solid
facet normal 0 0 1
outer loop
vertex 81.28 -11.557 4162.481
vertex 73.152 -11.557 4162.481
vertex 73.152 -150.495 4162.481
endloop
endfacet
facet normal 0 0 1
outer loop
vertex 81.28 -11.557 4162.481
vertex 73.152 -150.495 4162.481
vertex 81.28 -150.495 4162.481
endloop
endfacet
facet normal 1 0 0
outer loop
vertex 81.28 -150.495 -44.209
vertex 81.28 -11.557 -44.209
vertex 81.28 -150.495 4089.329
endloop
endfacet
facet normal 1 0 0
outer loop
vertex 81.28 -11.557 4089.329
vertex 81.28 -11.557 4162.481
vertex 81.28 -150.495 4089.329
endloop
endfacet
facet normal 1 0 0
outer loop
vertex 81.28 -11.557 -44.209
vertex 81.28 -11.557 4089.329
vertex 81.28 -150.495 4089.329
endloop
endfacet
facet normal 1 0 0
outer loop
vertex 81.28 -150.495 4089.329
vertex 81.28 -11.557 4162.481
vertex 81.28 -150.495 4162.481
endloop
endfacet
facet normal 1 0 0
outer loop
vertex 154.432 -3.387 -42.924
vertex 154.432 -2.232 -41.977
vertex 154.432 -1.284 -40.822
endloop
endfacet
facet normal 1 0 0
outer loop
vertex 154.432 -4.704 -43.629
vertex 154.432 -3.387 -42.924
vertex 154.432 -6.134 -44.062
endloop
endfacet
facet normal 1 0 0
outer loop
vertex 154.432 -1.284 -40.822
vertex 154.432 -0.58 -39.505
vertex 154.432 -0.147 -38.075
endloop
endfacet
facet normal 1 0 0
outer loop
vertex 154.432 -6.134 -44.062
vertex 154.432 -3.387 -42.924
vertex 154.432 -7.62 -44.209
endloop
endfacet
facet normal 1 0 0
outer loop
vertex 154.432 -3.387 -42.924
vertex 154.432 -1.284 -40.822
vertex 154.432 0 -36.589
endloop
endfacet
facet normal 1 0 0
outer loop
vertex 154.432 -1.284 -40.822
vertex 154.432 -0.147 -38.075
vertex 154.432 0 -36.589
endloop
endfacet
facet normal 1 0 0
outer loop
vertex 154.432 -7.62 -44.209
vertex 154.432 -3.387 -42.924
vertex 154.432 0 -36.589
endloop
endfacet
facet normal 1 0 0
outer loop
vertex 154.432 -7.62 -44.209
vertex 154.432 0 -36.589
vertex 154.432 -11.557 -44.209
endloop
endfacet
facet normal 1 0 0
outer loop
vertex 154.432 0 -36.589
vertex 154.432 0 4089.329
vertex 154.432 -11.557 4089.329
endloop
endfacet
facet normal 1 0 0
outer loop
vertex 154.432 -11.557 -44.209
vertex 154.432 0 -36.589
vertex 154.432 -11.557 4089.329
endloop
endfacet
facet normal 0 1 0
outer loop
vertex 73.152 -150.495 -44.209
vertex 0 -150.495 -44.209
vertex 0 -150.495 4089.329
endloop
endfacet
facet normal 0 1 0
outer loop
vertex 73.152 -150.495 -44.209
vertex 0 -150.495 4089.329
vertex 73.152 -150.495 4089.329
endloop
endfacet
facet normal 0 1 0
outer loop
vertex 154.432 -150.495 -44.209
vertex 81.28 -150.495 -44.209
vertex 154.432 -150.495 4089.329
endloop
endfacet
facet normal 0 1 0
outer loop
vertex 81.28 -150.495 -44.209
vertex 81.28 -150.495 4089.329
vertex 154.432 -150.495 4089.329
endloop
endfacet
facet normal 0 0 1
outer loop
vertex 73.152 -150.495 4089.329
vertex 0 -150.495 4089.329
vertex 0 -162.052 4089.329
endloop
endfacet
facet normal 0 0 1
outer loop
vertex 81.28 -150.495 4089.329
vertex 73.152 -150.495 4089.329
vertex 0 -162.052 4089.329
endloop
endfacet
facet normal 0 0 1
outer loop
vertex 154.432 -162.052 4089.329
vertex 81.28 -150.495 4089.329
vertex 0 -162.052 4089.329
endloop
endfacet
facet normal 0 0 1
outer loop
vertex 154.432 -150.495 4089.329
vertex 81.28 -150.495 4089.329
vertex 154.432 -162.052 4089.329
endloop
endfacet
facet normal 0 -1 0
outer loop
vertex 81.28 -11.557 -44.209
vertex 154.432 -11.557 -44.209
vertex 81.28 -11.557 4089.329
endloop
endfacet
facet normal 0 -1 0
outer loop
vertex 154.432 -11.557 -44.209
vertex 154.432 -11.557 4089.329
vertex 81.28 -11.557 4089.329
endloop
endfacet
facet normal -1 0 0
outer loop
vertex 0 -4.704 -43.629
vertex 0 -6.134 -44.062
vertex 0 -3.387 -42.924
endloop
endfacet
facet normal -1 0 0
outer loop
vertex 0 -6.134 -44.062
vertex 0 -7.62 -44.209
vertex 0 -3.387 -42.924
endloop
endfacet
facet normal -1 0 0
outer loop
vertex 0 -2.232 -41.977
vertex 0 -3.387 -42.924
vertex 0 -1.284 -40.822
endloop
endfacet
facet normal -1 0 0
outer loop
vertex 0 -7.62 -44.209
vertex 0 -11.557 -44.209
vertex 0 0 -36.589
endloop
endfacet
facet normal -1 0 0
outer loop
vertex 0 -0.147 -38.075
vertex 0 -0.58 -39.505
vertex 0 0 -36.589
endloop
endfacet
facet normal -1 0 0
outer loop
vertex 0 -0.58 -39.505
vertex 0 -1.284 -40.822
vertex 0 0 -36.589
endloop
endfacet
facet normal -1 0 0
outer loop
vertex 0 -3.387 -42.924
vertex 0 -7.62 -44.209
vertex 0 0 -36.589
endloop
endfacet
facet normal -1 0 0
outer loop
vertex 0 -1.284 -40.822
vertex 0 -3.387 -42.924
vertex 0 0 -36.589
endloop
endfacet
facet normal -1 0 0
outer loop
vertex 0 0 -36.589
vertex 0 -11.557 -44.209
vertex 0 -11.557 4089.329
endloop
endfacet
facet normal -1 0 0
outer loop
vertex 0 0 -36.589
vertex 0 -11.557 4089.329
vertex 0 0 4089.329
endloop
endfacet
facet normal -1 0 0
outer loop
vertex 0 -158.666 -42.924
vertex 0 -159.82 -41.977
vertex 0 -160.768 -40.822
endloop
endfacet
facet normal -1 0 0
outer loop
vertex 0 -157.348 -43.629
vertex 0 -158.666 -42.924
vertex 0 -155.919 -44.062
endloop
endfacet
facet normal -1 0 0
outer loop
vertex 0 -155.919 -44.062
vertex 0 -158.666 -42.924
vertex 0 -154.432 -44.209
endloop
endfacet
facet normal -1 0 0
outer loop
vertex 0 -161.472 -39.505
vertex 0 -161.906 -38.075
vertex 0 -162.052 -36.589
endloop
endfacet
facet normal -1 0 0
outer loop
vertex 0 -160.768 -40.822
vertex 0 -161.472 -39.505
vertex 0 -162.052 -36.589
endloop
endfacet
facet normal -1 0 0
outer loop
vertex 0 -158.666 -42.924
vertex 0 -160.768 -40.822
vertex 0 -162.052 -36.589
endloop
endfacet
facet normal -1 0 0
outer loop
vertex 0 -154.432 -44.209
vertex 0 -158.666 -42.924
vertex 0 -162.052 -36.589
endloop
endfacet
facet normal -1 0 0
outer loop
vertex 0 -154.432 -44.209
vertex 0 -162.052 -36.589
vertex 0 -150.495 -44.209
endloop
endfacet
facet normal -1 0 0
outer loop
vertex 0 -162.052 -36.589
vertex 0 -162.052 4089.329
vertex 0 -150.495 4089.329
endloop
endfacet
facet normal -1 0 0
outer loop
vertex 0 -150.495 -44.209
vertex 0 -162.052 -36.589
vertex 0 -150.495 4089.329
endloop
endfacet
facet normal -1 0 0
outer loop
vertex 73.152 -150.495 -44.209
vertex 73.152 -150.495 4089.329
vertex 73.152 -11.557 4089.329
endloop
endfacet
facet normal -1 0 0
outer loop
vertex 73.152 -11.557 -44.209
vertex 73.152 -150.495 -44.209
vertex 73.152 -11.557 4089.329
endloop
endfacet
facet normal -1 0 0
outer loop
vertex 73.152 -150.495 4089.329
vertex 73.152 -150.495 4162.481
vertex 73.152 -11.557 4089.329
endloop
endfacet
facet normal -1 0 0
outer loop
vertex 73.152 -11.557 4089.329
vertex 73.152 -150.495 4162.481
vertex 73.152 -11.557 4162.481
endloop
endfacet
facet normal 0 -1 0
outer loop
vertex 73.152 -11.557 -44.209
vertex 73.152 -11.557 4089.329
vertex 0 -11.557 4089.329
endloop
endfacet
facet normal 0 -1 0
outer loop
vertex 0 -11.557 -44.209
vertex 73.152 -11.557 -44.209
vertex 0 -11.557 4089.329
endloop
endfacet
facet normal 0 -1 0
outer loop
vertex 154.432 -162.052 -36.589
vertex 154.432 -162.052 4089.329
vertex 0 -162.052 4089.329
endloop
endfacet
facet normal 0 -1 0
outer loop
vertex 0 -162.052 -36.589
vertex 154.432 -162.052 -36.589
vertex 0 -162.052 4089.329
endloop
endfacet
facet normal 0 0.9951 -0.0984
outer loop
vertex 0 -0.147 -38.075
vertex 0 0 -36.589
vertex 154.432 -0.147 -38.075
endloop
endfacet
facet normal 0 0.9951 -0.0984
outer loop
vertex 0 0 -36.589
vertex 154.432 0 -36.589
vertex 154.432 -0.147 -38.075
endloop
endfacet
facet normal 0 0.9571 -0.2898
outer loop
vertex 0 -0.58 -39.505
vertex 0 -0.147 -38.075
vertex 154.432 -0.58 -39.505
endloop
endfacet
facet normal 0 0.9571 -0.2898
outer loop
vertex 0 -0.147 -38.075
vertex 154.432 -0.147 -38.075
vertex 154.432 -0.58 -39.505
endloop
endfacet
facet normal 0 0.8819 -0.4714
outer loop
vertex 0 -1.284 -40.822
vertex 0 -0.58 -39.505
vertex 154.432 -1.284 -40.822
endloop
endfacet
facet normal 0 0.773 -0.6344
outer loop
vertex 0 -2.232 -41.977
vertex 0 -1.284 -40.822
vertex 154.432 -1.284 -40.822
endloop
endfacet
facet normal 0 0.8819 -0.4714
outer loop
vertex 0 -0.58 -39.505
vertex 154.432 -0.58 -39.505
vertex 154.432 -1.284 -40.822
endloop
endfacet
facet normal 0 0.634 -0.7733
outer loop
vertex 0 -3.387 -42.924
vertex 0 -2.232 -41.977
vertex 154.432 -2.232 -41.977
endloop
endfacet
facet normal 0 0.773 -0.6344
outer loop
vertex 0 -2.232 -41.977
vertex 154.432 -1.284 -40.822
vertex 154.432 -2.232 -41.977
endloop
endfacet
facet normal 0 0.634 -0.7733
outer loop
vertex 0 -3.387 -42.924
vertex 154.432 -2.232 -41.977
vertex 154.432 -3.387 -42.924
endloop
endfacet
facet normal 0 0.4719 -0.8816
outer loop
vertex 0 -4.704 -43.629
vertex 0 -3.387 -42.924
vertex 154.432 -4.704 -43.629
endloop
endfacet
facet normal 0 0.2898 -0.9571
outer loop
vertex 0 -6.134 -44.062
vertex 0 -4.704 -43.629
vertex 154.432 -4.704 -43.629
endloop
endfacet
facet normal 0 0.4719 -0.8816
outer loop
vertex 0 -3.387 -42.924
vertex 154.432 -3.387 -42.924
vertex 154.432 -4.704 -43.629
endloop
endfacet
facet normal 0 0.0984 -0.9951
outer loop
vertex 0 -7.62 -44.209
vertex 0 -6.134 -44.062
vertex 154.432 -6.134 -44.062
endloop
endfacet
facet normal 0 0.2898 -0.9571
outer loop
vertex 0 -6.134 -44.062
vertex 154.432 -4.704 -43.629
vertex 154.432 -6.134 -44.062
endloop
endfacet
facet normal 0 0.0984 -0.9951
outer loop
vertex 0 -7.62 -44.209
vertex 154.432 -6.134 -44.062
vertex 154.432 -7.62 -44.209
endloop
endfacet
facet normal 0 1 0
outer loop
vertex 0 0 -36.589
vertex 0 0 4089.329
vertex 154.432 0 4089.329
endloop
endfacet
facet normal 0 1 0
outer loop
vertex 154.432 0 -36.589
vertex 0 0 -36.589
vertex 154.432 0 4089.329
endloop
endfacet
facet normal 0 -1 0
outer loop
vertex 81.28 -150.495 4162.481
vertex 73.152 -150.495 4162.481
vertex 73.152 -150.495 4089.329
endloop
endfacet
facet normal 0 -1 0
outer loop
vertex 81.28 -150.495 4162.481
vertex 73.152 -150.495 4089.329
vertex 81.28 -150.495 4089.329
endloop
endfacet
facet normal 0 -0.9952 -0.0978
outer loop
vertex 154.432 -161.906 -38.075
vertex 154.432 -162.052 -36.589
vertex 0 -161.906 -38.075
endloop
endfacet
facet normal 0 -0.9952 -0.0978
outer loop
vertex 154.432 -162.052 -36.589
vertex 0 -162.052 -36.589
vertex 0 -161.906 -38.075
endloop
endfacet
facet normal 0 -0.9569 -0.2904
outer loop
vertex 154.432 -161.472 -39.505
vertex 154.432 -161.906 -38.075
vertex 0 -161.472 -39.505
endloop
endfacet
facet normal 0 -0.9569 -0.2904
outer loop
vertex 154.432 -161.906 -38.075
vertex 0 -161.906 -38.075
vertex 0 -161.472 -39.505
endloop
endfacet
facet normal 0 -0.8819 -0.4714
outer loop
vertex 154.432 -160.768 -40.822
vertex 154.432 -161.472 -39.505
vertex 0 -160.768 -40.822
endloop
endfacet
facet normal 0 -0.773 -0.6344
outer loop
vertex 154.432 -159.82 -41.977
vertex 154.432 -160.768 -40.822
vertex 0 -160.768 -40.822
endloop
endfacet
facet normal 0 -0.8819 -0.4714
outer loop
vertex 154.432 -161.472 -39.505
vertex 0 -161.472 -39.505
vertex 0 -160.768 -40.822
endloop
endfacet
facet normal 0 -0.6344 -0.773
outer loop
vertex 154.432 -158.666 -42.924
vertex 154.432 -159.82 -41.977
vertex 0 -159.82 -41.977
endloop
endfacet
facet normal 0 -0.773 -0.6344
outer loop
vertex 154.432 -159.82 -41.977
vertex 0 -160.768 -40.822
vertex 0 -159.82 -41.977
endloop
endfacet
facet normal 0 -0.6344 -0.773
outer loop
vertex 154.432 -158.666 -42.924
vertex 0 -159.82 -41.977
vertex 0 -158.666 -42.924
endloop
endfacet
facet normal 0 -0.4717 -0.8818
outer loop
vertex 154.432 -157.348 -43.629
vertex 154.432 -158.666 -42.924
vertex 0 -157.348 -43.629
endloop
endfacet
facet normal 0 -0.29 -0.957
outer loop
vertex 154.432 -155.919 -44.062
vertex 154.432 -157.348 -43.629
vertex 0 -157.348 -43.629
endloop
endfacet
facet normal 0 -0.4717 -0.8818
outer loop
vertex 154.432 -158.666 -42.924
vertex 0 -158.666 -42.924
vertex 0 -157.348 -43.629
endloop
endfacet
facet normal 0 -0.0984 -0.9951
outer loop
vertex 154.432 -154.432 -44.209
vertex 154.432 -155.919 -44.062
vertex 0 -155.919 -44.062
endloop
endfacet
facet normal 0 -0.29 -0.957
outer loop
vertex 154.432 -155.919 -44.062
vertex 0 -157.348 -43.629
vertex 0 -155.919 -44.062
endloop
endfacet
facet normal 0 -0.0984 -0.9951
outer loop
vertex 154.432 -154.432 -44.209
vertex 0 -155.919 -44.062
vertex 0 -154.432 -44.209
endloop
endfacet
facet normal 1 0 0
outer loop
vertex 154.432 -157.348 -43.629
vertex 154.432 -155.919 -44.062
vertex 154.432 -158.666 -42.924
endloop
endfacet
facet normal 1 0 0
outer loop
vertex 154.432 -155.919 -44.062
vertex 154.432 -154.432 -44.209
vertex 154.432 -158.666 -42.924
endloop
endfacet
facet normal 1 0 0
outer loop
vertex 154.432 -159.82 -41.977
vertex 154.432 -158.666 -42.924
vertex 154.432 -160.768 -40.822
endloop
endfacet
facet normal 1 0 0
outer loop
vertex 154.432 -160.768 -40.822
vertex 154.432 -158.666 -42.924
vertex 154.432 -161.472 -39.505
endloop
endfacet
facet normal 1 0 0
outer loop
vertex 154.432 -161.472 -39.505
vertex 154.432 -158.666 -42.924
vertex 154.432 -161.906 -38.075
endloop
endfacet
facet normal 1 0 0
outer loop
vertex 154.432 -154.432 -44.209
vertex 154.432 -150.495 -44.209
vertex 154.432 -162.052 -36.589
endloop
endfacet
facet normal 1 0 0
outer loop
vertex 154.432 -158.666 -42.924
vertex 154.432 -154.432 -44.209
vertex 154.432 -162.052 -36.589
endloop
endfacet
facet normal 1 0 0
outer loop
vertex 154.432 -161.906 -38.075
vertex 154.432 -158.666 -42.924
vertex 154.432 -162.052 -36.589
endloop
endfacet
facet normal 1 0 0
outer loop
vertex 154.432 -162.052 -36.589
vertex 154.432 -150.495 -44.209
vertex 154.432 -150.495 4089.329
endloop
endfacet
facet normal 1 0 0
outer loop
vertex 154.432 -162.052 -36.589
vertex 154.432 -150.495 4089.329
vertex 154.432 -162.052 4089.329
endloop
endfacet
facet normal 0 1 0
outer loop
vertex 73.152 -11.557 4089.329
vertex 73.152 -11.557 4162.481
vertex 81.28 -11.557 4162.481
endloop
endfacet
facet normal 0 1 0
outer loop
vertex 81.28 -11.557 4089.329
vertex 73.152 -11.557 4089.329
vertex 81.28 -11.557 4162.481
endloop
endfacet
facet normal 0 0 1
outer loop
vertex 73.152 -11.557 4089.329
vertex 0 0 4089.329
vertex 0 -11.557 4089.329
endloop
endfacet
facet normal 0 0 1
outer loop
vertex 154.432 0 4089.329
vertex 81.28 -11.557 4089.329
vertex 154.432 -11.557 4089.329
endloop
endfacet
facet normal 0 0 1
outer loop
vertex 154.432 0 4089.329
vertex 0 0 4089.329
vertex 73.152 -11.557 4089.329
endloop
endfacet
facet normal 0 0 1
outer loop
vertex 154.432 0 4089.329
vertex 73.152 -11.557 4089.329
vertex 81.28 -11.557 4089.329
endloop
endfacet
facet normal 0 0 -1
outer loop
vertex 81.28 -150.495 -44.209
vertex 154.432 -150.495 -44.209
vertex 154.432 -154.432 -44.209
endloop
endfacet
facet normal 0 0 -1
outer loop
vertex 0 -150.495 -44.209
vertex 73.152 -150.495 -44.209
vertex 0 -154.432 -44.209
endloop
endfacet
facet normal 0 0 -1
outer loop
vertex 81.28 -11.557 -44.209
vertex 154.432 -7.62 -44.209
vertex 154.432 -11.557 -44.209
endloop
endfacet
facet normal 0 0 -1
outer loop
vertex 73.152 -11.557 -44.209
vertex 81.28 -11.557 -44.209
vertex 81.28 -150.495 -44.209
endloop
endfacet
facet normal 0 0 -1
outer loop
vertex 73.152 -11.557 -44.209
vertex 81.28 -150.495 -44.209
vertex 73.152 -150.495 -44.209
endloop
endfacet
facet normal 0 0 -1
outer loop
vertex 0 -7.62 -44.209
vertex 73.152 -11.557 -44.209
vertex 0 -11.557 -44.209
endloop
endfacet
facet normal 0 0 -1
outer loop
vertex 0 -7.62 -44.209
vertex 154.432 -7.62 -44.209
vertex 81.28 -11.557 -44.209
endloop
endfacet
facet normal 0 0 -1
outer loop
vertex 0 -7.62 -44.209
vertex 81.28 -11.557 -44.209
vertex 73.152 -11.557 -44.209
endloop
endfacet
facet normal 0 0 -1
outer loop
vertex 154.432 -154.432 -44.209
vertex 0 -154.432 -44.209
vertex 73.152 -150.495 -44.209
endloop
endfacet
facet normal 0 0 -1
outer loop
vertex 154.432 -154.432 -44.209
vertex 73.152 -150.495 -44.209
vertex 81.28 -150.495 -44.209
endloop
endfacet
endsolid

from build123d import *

# Parameters (mm, degrees)
BOSS_EXTRUDE1_DEPTH       = 4000
BOSS_EXTRUDE2_DEPTH       = 89.328594679
BOSS_EXTRUDE2_START       = 89.328594679
BOSS_EXTRUDE2_2_OUTLINE_W = 8.128
BOSS_EXTRUDE2_2_OUTLINE_H = 138.938
BOSS_EXTRUDE2_2_DEPTH     = 73.152
BOSS_EXTRUDE5_DEPTH       = 44.208643554
FILLET1_R                 = 7.62


# Read off the part's stored shape, not the designer's step: Boss-Extrude2
with BuildPart() as part:
    # Sketch1 → Boss-Extrude1 (new body)
    with BuildSketch(Plane.XY):
        Polygon((0, -0.000240533), (154.432, -0.000240533), (154.432, -11.557240533), (81.28, -11.557240533), (81.28, -150.495240533), (154.432, -150.495240533), (154.432, -162.052240533), (0, -162.052240533), (0, -150.495240533), (73.152, -150.495240533), (73.152, -11.557240533), (0, -11.557240533), align=None)
    extrude(amount=BOSS_EXTRUDE1_DEPTH)

    # Boss-Extrude2 outline → Boss-Extrude2 (add)
    with BuildSketch(Plane.XY.offset(4000)):
        Polygon((81.28, -150.495240533), (81.28, -11.557240533), (154.432, -11.557240533), (154.432, -0.000240533), (0, -0.000240533), (0, -11.557240533), (73.152, -11.557240533), (73.152, -150.495240533), (0, -150.495240533), (0, -162.052240533), (154.432, -162.052240533), (154.432, -150.495240533), align=None)
    extrude(amount=BOSS_EXTRUDE2_DEPTH)

    # Boss-Extrude2 2 outline → Boss-Extrude2 2 (add)
    with BuildSketch(Plane.XY.offset(4000).offset(BOSS_EXTRUDE2_START)):
        with Locations((77.216, -81.026240533)):
            Rectangle(BOSS_EXTRUDE2_2_OUTLINE_W, BOSS_EXTRUDE2_2_OUTLINE_H)
    extrude(amount=BOSS_EXTRUDE2_2_DEPTH)

    # Sketch4 → Boss-Extrude5 (add)
    with BuildSketch(Plane(origin=(0, 0, 0), x_dir=(-1, 0, 0), z_dir=(0, 0, -1))):
        Polygon((0, -11.557240533), (0, -0.000240533), (-154.432, -0.000240533), (-154.432, -11.557240533), (-81.28, -11.557240533), (-81.28, -150.495240533), (-154.432, -150.495240533), (-154.432, -162.052240533), (0, -162.052240533), (0, -150.495240533), (-73.152, -150.495240533), (-73.152, -11.557240533), align=None)
    extrude(amount=BOSS_EXTRUDE5_DEPTH)

    # Fillet1
    fillet1_edges = [part.edges().sort_by_distance(p)[0] for p in [
        (77.216, -162.052240533, -44.208643554),
        (77.216, -0.000240533, -44.208643554),
    ]]
    fillet(fillet1_edges, radius=FILLET1_R)


solid = part.part
